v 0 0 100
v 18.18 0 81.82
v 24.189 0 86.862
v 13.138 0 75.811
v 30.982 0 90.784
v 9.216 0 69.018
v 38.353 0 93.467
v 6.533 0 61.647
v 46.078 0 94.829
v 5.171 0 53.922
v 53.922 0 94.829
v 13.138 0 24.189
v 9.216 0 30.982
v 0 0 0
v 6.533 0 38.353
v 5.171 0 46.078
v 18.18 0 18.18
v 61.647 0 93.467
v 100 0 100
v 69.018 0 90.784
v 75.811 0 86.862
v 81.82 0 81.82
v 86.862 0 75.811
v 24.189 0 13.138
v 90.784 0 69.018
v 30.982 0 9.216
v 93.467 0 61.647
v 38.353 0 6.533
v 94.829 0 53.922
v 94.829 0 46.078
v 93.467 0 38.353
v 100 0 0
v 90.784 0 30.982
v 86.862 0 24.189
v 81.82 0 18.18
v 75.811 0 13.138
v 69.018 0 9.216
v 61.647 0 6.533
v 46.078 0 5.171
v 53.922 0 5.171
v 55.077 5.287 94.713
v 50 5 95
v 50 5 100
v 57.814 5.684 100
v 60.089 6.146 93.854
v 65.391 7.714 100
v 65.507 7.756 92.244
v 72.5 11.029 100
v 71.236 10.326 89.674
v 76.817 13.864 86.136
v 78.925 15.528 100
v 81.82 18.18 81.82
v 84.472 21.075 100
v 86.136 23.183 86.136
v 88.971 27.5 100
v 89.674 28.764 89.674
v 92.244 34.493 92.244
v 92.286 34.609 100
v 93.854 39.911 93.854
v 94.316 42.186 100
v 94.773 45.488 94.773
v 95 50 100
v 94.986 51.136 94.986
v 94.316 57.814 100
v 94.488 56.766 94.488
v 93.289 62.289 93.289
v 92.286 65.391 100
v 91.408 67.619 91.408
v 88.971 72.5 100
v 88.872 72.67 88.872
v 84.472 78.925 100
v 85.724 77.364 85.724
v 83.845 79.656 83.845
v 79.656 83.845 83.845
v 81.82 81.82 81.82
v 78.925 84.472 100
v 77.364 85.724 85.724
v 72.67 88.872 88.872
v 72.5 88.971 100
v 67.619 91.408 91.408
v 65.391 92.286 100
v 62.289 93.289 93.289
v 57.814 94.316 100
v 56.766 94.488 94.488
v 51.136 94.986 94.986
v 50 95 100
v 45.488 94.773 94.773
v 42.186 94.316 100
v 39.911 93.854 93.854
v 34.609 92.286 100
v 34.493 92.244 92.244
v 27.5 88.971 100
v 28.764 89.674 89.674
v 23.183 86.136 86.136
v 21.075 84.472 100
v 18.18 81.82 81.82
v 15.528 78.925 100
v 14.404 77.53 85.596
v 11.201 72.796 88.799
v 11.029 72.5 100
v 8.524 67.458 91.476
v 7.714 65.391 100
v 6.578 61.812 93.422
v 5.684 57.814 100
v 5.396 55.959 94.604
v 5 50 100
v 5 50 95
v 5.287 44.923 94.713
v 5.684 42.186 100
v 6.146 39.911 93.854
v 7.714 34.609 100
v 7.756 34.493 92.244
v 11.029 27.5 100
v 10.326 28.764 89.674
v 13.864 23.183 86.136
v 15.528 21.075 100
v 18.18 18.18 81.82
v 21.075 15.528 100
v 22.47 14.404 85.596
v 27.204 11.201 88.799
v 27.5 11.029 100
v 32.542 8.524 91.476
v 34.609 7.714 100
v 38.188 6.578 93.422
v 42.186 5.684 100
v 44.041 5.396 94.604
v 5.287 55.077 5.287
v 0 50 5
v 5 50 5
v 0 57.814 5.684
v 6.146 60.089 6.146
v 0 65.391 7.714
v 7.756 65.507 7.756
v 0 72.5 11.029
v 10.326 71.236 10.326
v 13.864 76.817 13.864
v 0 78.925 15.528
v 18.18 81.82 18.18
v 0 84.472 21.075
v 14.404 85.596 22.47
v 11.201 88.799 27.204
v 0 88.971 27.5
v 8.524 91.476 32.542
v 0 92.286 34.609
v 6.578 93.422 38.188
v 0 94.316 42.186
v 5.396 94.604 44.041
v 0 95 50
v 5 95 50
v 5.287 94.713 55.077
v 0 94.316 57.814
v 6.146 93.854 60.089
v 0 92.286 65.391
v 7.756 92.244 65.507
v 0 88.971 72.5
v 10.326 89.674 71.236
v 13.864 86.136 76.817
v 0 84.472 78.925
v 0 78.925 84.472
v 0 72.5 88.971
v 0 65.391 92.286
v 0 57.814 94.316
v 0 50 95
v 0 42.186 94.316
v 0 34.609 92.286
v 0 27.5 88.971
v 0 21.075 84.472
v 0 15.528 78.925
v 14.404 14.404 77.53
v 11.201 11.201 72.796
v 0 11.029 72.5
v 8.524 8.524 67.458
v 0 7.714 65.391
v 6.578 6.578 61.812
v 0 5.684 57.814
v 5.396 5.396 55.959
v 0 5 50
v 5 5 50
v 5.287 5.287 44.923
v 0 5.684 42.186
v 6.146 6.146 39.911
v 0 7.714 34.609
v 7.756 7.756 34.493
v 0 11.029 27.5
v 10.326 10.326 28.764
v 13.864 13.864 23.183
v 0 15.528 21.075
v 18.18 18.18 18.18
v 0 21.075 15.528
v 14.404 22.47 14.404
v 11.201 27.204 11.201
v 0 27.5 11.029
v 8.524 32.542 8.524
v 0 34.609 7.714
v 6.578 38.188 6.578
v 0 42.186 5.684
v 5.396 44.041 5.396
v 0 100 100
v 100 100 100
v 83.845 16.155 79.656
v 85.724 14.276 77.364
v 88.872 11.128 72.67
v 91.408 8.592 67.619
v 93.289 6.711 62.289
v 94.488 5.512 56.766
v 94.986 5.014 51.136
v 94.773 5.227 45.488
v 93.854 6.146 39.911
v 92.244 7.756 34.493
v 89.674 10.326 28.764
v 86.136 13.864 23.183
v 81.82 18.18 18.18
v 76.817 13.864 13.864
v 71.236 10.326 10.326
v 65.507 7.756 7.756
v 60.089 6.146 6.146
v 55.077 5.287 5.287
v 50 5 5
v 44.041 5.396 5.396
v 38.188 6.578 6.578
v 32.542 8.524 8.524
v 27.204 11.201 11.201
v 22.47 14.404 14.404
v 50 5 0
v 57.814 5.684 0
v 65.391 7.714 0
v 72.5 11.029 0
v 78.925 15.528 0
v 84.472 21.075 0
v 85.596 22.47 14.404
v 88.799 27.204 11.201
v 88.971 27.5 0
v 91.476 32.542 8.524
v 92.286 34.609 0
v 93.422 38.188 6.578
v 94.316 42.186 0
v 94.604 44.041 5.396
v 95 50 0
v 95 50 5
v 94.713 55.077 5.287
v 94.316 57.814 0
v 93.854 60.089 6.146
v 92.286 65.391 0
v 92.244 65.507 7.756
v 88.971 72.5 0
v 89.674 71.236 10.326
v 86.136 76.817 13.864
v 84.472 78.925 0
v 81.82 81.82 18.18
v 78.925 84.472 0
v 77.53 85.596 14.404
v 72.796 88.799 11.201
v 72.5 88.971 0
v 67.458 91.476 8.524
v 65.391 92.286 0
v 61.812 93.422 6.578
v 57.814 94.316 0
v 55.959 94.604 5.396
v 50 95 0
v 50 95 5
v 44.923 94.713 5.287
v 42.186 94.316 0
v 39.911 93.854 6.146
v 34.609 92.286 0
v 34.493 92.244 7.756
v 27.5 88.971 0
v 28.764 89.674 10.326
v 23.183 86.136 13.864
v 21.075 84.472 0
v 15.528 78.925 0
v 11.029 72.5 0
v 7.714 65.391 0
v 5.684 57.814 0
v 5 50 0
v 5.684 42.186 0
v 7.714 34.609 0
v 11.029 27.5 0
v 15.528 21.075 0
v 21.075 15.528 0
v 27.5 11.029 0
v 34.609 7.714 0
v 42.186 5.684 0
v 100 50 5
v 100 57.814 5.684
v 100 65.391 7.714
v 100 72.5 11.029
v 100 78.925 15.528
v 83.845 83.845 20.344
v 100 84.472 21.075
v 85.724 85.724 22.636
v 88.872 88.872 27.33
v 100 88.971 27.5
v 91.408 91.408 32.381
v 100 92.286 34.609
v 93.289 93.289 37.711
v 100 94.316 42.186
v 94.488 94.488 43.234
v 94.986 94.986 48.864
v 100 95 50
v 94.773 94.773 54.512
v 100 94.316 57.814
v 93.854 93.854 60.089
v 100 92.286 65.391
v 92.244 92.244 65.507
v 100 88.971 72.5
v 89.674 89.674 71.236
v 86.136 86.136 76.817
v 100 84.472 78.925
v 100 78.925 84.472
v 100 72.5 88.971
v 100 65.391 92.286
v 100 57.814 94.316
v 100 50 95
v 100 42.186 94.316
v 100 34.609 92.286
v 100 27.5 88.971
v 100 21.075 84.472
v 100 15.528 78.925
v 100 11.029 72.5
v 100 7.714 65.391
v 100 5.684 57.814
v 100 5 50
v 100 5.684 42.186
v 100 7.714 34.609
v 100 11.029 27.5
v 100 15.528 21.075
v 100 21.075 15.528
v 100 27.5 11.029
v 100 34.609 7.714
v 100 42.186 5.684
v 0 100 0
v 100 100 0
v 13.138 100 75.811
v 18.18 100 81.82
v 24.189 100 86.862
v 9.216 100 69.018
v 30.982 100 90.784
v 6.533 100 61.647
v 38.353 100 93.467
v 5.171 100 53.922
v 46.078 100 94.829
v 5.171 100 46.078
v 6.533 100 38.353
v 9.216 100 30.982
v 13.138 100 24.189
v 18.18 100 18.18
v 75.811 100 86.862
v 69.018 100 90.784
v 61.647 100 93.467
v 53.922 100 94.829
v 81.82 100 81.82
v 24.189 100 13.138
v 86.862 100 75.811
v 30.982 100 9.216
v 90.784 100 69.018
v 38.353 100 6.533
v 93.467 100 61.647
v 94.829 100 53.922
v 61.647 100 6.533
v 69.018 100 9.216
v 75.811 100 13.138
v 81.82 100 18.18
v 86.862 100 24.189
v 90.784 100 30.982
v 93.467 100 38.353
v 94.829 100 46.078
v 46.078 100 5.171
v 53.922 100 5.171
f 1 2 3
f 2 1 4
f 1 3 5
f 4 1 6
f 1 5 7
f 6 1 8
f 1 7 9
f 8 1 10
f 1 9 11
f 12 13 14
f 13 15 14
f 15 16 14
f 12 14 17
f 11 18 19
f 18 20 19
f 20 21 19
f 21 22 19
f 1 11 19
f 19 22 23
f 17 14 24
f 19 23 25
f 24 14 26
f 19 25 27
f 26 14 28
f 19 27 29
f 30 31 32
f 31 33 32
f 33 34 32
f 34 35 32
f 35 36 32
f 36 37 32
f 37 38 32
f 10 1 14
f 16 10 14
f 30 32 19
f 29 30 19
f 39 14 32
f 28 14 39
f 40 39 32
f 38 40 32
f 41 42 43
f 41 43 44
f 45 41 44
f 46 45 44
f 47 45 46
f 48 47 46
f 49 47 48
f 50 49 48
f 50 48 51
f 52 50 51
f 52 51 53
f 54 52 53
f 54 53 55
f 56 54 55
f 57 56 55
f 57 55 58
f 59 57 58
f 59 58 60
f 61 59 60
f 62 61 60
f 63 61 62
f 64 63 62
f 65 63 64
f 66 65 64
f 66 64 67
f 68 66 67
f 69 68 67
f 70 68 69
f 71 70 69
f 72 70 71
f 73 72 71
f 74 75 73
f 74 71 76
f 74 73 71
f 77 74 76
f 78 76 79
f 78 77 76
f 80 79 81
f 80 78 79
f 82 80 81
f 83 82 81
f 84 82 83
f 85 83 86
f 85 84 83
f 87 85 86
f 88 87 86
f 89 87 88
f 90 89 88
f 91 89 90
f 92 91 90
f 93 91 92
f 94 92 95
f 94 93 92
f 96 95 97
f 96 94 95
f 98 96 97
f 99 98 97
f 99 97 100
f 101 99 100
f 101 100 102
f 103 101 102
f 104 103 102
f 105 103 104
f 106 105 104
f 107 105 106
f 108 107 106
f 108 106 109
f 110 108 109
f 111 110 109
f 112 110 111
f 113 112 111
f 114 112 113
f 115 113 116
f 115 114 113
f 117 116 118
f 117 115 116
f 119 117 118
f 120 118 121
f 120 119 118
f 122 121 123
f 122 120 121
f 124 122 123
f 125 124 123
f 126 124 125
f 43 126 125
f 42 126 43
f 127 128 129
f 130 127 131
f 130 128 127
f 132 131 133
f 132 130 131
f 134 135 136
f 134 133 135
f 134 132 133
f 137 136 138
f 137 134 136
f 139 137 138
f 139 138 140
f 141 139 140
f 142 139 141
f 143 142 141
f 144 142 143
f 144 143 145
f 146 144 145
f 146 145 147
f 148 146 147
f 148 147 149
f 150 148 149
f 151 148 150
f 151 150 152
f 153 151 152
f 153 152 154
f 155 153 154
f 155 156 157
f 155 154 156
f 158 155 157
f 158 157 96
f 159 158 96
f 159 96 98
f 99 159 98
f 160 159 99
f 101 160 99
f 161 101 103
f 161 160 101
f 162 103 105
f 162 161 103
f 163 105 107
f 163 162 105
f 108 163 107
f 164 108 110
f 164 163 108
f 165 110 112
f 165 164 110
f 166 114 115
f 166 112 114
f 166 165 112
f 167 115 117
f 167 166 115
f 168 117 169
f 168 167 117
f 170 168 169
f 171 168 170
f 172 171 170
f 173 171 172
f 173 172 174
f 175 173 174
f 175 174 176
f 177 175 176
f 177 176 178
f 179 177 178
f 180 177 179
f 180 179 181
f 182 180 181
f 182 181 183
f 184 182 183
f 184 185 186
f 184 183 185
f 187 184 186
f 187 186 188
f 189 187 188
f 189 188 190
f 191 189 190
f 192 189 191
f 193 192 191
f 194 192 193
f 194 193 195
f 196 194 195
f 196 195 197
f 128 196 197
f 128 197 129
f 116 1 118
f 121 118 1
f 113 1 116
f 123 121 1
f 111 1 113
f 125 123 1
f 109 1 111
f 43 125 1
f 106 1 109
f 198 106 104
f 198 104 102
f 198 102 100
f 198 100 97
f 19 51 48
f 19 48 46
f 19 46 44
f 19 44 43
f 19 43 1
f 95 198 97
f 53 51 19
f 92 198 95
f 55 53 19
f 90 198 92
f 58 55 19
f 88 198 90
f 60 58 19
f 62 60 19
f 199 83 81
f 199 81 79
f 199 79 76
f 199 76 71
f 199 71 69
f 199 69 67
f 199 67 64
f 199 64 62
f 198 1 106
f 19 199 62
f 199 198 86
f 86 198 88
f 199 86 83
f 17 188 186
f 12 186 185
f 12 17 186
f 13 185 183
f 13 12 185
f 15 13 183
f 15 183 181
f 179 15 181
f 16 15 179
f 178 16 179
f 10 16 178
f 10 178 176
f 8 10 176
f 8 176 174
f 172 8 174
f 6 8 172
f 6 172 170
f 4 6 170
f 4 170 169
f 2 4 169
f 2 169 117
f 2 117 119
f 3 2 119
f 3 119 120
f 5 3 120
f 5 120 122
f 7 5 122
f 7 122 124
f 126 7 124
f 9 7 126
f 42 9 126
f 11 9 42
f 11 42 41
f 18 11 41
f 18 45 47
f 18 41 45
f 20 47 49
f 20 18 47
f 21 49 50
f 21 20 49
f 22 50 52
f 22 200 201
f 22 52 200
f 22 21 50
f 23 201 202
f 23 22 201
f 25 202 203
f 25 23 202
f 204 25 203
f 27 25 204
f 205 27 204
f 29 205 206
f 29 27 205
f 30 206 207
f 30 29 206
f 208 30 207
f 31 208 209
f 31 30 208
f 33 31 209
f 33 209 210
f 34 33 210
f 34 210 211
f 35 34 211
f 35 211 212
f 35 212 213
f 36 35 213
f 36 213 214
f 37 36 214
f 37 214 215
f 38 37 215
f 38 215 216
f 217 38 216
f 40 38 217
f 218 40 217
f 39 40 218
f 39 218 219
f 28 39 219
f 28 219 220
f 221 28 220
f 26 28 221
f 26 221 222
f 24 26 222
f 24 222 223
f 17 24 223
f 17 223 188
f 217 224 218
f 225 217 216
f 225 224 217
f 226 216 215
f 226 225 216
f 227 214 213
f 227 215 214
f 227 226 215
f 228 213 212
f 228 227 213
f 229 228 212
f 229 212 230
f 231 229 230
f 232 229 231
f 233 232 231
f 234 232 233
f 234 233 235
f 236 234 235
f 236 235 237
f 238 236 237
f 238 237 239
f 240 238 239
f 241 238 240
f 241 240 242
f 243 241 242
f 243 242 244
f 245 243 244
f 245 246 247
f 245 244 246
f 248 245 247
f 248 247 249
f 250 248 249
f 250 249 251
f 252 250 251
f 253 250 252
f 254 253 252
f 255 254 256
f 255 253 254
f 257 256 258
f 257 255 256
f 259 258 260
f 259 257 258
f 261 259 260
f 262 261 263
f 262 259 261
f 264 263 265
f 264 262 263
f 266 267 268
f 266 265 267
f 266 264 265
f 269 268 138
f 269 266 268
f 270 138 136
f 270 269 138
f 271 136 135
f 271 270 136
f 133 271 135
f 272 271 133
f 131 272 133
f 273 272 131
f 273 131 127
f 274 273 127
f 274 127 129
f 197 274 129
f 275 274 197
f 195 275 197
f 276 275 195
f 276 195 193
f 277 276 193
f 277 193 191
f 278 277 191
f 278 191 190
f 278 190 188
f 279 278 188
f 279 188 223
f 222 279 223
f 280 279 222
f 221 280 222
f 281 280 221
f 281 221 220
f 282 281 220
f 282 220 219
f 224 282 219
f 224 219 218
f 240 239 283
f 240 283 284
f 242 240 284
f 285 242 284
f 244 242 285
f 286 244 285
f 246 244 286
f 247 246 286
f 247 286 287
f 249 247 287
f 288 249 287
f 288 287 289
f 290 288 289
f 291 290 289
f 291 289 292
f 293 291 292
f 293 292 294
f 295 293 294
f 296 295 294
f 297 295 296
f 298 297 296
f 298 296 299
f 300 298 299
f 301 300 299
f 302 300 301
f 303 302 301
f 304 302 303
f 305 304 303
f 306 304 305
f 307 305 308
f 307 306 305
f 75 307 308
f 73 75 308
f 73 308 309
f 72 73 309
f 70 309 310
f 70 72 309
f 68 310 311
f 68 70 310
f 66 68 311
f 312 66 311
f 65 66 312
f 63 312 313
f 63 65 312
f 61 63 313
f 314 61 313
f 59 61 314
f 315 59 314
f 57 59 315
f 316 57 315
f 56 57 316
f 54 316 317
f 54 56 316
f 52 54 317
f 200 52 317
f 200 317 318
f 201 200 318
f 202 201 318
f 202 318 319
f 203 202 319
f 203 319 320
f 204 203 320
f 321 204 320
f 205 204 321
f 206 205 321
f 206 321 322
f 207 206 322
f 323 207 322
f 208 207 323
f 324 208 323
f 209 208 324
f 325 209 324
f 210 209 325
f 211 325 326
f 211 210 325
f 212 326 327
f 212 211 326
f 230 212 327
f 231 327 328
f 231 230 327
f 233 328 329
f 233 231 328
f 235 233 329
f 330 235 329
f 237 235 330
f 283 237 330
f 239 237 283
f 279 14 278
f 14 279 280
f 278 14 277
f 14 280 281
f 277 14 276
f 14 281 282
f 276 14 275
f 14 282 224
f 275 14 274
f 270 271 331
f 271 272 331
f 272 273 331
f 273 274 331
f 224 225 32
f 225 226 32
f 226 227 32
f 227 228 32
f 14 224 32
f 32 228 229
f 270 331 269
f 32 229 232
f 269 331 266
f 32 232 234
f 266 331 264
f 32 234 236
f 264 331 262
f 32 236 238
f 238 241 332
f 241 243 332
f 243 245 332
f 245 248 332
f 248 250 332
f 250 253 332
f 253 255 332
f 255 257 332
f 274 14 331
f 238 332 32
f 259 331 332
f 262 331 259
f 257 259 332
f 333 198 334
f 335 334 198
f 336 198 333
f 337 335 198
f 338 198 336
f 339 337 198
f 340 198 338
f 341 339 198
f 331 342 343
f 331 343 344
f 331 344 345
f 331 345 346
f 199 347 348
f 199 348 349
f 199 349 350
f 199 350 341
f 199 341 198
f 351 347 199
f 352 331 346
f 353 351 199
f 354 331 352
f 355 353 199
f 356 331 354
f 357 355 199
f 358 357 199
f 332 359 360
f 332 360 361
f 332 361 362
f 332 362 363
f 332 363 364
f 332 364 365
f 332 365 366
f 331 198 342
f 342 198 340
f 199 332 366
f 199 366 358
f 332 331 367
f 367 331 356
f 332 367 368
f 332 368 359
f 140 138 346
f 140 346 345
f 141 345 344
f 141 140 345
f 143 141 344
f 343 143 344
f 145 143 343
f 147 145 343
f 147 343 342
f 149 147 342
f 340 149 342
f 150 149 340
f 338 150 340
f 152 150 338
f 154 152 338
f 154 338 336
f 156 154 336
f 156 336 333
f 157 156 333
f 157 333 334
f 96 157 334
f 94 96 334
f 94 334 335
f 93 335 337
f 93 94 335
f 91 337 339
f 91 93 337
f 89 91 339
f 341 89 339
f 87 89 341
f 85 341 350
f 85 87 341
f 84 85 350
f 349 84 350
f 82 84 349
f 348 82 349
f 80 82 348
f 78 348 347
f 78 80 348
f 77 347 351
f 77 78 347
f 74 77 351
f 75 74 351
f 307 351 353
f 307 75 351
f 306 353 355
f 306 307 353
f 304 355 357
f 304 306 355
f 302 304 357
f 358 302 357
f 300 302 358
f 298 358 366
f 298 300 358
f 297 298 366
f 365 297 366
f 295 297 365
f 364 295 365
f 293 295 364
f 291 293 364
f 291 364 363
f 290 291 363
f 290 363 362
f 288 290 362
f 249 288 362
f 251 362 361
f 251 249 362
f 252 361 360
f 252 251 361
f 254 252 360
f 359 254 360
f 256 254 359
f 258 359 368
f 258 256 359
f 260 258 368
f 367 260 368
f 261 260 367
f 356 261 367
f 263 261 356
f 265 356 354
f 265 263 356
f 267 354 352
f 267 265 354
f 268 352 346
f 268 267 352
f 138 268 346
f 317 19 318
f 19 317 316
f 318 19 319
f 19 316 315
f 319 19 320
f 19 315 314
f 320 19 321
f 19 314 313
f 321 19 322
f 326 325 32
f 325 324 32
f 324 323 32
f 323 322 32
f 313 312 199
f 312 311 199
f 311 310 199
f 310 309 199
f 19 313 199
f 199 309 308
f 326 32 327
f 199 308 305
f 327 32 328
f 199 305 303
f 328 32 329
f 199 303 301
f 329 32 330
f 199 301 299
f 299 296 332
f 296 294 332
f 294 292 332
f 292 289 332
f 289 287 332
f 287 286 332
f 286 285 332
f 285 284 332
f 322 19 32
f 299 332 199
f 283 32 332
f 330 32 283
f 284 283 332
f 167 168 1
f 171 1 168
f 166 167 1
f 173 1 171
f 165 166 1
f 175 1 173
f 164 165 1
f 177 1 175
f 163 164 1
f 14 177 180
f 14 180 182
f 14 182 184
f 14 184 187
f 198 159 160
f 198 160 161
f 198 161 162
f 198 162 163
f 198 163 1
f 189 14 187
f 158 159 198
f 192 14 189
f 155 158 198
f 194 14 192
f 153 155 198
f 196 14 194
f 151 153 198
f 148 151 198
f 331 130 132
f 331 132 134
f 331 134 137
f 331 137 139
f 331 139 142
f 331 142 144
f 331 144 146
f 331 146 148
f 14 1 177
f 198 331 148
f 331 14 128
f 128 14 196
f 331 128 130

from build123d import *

# Parameters (mm, degrees)
SKETCH1_W          = 100
SKETCH1_H          = 100
EXTRUDE1_DEPTH     = 100
SKETCH2_R          = 45
CUT_EXTRUDE1_DEPTH = 174.205080757
SKETCH4_R          = 45
CUT_EXTRUDE2_DEPTH = 174.205080757
SKETCH5_R          = 45
CUT_EXTRUDE3_DEPTH = 174.205080757


with BuildPart() as part:
    # Sketch1 → Extrude1 (new body)
    with BuildSketch(Plane.XY):
        with Locations((50, 50)):
            Rectangle(SKETCH1_W, SKETCH1_H)
    extrude(amount=EXTRUDE1_DEPTH)

    # Sketch2 → Cut-Extrude1 (cut, through all)
    with BuildSketch(Plane(origin=(0, 0, 0), x_dir=(0, 0, -1), z_dir=(1, 0, 0))):
        with Locations((-50, 50)):
            Circle(SKETCH2_R)
    extrude(amount=CUT_EXTRUDE1_DEPTH, mode=Mode.SUBTRACT)

    # Sketch4 → Cut-Extrude2 (cut, through all)
    with BuildSketch(Plane(origin=(100, 0, 0), x_dir=(1, 0, 0), z_dir=(0, 0, 1))):
        with Locations(Location((-50, 50, 0), (0, 0, 270))):
            Circle(SKETCH4_R)
    extrude(amount=CUT_EXTRUDE2_DEPTH, mode=Mode.SUBTRACT)

    # Sketch5 → Cut-Extrude3 (cut, through all)
    with BuildSketch(Plane(origin=(100, 0, 0), x_dir=(0, 0, -1), z_dir=(0, 1, 0))):
        with Locations(Location((-50, 50, 0), (0, 0, 45))):
            Circle(SKETCH5_R)
    extrude(amount=CUT_EXTRUDE3_DEPTH, mode=Mode.SUBTRACT)


solid = part.part
